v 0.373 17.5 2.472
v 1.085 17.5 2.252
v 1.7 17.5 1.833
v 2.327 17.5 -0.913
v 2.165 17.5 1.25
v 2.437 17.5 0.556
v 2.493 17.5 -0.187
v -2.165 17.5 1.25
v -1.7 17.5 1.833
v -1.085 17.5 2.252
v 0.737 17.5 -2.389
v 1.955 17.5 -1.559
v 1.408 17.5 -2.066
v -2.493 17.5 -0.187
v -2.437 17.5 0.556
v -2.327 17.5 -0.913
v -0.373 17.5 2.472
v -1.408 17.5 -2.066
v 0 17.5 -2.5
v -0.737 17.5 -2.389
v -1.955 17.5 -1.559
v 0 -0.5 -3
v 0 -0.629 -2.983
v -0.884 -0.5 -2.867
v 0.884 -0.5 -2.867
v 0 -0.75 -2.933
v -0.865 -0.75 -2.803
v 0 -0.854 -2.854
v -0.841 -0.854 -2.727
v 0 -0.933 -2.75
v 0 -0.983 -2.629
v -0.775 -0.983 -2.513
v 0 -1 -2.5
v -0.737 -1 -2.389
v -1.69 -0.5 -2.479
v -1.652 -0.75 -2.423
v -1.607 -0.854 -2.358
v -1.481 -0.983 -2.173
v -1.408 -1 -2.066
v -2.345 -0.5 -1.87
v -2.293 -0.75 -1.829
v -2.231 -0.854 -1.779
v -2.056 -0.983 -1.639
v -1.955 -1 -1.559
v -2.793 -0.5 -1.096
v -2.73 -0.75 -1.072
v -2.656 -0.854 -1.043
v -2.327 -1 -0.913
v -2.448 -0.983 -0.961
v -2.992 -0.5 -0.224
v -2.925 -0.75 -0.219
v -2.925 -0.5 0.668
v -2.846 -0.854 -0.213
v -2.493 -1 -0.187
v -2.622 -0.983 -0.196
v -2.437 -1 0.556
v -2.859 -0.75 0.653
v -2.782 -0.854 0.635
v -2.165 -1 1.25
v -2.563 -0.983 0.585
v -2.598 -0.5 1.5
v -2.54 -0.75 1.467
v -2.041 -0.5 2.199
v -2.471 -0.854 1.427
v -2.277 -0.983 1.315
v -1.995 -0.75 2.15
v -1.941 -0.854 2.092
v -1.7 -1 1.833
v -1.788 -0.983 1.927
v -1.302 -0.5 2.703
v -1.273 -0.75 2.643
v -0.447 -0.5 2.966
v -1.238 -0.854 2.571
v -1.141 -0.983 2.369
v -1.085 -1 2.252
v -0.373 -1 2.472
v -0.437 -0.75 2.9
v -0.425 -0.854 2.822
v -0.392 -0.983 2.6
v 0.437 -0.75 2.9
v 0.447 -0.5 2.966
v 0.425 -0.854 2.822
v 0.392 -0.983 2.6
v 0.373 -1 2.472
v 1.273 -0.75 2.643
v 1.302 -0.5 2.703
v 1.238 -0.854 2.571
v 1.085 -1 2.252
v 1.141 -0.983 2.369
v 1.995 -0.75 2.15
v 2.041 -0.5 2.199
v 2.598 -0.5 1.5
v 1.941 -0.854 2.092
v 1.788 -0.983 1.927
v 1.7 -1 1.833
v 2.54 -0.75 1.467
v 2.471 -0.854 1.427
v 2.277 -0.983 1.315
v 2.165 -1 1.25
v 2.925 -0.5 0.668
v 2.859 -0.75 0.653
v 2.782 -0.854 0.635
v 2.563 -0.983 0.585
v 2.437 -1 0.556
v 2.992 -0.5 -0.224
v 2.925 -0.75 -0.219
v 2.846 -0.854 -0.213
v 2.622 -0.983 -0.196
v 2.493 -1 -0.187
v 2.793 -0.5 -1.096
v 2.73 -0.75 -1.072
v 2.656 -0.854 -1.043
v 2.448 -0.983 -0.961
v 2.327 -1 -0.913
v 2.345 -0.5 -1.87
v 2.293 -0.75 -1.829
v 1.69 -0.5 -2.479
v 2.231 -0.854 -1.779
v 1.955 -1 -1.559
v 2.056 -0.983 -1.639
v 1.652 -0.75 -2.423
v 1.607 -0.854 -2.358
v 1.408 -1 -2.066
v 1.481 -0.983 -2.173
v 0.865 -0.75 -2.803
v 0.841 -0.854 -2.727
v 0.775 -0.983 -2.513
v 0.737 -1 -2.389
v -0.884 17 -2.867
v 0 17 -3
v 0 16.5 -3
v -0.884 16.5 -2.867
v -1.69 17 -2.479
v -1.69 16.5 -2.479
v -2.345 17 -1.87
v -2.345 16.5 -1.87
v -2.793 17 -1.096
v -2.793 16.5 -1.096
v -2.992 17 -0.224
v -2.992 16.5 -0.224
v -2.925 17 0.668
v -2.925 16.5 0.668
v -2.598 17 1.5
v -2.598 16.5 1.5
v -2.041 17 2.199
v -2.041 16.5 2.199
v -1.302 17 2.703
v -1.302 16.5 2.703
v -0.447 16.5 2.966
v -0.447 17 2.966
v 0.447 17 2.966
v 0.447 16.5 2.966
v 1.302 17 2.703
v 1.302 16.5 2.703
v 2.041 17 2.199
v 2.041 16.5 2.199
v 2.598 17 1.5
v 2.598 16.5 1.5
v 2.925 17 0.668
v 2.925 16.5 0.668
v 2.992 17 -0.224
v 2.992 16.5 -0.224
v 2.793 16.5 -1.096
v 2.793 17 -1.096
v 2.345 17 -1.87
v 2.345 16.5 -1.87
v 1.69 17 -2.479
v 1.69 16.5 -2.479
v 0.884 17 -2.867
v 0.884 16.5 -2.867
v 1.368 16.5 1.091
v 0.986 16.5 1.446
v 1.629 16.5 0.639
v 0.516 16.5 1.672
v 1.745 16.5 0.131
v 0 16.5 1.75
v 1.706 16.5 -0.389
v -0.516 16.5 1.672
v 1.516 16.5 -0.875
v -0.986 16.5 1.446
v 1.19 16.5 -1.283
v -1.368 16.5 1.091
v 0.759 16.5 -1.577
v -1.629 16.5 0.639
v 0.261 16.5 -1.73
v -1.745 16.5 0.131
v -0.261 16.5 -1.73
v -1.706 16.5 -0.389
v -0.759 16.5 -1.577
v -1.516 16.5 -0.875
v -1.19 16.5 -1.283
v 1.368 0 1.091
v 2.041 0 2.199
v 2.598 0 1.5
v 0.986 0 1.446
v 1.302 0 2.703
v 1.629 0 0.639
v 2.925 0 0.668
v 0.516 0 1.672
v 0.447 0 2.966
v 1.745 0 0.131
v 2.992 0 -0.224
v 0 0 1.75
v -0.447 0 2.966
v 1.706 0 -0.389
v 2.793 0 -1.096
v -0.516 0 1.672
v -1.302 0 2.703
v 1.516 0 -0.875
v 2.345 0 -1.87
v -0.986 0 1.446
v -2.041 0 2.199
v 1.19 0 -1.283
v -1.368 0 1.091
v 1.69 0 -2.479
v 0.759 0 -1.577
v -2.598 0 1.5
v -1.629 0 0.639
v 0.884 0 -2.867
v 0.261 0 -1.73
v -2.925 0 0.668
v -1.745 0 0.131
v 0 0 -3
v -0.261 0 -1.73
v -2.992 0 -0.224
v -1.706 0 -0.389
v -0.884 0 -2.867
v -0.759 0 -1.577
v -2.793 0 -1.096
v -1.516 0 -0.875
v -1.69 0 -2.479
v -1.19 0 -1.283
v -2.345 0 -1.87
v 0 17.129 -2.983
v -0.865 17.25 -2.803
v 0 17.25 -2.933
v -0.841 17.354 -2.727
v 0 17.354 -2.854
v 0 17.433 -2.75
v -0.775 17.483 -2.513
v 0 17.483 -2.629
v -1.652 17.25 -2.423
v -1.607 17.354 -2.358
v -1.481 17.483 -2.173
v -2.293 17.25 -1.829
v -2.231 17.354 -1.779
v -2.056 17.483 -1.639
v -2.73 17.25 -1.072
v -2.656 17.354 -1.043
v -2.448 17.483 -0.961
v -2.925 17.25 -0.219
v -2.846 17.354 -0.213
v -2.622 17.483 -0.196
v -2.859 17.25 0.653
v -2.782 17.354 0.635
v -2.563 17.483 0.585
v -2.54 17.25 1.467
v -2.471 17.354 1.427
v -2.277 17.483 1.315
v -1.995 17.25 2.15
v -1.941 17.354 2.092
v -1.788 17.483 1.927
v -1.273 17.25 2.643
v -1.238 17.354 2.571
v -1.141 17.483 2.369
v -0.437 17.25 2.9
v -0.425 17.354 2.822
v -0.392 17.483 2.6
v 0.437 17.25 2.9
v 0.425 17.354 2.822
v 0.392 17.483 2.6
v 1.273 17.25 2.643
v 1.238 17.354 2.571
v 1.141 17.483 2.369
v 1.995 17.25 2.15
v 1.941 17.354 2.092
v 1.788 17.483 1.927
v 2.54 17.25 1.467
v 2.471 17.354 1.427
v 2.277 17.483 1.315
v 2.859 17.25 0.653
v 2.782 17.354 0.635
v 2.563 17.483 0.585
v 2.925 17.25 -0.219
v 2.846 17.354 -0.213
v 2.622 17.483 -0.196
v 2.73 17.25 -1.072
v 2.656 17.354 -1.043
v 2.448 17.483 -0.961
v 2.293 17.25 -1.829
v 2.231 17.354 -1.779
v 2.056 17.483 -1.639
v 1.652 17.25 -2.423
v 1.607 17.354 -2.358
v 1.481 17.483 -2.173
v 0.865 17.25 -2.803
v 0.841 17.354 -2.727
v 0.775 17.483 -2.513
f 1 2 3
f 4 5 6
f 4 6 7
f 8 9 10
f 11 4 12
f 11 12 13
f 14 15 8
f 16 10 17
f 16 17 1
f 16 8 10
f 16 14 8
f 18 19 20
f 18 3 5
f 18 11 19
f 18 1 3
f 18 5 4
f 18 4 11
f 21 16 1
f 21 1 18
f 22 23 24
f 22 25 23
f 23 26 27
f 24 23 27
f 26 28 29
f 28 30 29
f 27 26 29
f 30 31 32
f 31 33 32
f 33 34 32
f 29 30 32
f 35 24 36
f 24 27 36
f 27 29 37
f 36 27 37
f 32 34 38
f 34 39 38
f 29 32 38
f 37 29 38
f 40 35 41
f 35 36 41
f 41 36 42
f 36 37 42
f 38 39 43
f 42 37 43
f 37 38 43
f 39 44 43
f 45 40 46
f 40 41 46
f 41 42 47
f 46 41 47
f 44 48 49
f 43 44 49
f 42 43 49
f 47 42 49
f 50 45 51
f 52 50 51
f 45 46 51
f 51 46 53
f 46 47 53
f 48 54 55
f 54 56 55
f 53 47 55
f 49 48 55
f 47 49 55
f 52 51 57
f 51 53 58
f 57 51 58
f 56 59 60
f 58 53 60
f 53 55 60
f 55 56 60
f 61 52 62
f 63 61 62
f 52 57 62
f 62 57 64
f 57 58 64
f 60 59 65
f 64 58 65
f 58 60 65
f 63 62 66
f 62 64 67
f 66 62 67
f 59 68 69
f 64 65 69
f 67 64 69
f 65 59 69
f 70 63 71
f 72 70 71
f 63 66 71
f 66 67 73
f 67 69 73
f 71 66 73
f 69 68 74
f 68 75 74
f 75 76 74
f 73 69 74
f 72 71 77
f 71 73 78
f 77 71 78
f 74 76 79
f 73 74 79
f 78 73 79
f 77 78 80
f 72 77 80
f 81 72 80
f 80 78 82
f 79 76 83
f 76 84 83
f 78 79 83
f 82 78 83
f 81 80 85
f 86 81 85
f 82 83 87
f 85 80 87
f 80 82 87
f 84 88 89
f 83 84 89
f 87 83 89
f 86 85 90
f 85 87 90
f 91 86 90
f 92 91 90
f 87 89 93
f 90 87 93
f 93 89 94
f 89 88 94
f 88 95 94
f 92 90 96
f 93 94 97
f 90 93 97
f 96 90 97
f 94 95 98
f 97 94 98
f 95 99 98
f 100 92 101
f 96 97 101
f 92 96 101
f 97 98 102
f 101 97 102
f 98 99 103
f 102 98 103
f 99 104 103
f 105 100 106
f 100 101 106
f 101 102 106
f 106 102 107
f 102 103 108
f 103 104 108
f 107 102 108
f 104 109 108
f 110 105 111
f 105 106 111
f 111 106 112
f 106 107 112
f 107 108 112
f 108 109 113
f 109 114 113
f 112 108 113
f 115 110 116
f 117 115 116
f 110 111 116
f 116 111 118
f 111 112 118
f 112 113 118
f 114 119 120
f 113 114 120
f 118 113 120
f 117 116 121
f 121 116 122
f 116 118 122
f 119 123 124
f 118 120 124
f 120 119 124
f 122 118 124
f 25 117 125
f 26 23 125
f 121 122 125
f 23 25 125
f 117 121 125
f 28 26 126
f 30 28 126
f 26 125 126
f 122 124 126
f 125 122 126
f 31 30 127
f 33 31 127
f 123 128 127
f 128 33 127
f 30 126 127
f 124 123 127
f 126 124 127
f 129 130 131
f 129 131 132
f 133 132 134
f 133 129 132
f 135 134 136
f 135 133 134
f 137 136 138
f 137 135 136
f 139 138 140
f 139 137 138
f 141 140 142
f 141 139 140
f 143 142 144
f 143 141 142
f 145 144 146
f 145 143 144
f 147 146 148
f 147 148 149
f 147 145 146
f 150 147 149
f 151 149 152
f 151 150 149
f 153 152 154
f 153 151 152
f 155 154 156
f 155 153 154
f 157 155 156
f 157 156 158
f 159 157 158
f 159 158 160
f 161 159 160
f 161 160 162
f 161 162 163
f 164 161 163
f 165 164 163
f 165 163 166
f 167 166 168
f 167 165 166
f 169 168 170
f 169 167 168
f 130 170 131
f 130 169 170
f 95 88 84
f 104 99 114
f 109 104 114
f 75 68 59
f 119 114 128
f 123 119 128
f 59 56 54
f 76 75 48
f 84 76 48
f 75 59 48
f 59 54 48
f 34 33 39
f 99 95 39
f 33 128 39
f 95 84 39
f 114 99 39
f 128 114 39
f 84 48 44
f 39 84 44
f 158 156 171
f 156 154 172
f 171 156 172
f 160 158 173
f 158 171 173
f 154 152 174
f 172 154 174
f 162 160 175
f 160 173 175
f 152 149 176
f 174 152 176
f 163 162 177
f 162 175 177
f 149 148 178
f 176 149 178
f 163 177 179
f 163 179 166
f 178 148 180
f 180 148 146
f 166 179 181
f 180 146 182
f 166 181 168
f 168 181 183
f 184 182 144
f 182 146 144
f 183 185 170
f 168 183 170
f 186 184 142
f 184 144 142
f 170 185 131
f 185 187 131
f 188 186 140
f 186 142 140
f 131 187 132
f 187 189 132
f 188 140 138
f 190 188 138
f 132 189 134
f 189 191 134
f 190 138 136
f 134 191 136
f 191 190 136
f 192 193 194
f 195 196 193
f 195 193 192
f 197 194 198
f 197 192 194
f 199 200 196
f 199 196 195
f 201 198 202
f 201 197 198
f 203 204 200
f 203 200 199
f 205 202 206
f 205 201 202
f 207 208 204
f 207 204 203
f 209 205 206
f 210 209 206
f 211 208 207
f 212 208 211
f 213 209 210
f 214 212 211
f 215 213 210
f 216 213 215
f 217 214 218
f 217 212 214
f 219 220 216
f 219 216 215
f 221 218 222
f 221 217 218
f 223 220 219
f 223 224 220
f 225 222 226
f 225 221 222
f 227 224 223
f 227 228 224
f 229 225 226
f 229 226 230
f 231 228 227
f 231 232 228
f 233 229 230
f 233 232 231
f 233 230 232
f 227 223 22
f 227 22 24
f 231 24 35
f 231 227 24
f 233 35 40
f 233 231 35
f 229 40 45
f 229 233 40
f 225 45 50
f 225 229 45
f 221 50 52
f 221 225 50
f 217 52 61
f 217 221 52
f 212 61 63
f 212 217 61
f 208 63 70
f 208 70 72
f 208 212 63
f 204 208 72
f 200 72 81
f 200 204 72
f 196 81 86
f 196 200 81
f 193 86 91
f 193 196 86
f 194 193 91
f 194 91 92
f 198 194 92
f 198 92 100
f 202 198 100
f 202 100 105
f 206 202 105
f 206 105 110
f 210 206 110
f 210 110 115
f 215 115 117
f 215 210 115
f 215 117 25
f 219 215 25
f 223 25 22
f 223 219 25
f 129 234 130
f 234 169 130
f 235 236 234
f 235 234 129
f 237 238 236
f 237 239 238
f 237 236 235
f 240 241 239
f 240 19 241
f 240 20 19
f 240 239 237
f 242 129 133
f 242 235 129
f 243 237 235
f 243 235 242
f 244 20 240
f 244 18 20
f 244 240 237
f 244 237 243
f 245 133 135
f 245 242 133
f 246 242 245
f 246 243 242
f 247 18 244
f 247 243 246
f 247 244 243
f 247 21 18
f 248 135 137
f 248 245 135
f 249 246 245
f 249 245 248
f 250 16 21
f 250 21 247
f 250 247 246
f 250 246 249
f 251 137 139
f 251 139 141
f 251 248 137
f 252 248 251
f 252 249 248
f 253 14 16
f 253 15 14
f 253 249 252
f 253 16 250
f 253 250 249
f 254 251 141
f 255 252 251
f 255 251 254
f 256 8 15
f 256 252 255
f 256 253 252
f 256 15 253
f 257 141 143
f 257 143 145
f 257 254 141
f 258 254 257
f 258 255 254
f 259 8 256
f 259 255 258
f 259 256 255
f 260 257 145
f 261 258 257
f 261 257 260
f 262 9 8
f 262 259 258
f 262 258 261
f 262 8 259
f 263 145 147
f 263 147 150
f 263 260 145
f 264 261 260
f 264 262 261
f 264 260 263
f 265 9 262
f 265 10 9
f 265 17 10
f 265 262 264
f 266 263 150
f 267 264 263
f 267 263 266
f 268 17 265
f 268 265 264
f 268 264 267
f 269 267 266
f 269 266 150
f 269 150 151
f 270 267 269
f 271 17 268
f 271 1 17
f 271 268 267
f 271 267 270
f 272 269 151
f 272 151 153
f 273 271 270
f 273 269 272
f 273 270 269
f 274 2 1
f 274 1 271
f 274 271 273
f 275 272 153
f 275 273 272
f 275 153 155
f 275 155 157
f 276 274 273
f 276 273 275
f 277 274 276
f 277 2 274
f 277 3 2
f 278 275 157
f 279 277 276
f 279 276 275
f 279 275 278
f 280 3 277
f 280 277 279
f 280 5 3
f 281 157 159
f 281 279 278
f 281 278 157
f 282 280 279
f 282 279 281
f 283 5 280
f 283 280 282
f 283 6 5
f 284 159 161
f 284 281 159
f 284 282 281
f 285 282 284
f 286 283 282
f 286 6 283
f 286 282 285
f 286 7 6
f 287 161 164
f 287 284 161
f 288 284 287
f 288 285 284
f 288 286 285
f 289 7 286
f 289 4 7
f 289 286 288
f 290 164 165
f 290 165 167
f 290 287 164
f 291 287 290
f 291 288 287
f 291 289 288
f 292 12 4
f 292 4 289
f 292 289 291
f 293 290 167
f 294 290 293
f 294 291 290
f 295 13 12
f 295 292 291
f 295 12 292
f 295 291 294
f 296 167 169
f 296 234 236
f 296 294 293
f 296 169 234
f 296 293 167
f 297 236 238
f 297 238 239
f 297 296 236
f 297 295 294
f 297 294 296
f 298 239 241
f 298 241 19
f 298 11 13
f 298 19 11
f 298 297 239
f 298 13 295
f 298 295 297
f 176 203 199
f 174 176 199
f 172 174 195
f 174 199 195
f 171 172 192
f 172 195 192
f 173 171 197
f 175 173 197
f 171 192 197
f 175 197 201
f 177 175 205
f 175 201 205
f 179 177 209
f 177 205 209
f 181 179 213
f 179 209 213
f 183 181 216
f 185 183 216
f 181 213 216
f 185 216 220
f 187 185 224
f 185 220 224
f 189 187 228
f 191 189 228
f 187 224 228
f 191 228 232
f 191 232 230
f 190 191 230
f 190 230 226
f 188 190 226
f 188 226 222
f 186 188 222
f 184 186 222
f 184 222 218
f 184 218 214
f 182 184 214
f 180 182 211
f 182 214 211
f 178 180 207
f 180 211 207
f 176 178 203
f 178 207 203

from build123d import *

# Parameters (mm, degrees)
SKETCH1_R           = 1.75
BOSS_EXTRUDE1_DEPTH = 16.5
SKETCH2_W           = 3
SKETCH2_H           = 1
FILLET1_R           = 0.5


with BuildPart() as part:
    # Sketch1 → Boss-Extrude1 (new body)
    with BuildSketch(Plane(origin=(0, 0, 0), x_dir=(1, 0, 0), z_dir=(0, 1, 0))):
        with Locations(Location((0, 0, 0), (0, 0, 270))):
            Circle(SKETCH1_R)
    extrude(amount=BOSS_EXTRUDE1_DEPTH)

    # Sketch2 → Revolve1 (revolve)
    with BuildSketch(Plane.XY, mode=Mode.PRIVATE) as revolve1_sk:
        with Locations((-1.5, 17)):
            Rectangle(SKETCH2_W, SKETCH2_H)
        with Locations((-1.5, -0.5)):
            Rectangle(SKETCH2_W, SKETCH2_H)
    revolve(revolve1_sk.sketch.rotate(Axis((0, 0, 0), (0, 1, 0)), 270), axis=Axis((0, 0, 0), (0, 1, 0)))

    # Fillet1
    fillet1_edges = [part.edges().sort_by_distance(p)[0] for p in [
        (0, -1, 3),
        (0, 17.5, 3),
    ]]
    fillet(fillet1_edges, radius=FILLET1_R)


solid = part.part
